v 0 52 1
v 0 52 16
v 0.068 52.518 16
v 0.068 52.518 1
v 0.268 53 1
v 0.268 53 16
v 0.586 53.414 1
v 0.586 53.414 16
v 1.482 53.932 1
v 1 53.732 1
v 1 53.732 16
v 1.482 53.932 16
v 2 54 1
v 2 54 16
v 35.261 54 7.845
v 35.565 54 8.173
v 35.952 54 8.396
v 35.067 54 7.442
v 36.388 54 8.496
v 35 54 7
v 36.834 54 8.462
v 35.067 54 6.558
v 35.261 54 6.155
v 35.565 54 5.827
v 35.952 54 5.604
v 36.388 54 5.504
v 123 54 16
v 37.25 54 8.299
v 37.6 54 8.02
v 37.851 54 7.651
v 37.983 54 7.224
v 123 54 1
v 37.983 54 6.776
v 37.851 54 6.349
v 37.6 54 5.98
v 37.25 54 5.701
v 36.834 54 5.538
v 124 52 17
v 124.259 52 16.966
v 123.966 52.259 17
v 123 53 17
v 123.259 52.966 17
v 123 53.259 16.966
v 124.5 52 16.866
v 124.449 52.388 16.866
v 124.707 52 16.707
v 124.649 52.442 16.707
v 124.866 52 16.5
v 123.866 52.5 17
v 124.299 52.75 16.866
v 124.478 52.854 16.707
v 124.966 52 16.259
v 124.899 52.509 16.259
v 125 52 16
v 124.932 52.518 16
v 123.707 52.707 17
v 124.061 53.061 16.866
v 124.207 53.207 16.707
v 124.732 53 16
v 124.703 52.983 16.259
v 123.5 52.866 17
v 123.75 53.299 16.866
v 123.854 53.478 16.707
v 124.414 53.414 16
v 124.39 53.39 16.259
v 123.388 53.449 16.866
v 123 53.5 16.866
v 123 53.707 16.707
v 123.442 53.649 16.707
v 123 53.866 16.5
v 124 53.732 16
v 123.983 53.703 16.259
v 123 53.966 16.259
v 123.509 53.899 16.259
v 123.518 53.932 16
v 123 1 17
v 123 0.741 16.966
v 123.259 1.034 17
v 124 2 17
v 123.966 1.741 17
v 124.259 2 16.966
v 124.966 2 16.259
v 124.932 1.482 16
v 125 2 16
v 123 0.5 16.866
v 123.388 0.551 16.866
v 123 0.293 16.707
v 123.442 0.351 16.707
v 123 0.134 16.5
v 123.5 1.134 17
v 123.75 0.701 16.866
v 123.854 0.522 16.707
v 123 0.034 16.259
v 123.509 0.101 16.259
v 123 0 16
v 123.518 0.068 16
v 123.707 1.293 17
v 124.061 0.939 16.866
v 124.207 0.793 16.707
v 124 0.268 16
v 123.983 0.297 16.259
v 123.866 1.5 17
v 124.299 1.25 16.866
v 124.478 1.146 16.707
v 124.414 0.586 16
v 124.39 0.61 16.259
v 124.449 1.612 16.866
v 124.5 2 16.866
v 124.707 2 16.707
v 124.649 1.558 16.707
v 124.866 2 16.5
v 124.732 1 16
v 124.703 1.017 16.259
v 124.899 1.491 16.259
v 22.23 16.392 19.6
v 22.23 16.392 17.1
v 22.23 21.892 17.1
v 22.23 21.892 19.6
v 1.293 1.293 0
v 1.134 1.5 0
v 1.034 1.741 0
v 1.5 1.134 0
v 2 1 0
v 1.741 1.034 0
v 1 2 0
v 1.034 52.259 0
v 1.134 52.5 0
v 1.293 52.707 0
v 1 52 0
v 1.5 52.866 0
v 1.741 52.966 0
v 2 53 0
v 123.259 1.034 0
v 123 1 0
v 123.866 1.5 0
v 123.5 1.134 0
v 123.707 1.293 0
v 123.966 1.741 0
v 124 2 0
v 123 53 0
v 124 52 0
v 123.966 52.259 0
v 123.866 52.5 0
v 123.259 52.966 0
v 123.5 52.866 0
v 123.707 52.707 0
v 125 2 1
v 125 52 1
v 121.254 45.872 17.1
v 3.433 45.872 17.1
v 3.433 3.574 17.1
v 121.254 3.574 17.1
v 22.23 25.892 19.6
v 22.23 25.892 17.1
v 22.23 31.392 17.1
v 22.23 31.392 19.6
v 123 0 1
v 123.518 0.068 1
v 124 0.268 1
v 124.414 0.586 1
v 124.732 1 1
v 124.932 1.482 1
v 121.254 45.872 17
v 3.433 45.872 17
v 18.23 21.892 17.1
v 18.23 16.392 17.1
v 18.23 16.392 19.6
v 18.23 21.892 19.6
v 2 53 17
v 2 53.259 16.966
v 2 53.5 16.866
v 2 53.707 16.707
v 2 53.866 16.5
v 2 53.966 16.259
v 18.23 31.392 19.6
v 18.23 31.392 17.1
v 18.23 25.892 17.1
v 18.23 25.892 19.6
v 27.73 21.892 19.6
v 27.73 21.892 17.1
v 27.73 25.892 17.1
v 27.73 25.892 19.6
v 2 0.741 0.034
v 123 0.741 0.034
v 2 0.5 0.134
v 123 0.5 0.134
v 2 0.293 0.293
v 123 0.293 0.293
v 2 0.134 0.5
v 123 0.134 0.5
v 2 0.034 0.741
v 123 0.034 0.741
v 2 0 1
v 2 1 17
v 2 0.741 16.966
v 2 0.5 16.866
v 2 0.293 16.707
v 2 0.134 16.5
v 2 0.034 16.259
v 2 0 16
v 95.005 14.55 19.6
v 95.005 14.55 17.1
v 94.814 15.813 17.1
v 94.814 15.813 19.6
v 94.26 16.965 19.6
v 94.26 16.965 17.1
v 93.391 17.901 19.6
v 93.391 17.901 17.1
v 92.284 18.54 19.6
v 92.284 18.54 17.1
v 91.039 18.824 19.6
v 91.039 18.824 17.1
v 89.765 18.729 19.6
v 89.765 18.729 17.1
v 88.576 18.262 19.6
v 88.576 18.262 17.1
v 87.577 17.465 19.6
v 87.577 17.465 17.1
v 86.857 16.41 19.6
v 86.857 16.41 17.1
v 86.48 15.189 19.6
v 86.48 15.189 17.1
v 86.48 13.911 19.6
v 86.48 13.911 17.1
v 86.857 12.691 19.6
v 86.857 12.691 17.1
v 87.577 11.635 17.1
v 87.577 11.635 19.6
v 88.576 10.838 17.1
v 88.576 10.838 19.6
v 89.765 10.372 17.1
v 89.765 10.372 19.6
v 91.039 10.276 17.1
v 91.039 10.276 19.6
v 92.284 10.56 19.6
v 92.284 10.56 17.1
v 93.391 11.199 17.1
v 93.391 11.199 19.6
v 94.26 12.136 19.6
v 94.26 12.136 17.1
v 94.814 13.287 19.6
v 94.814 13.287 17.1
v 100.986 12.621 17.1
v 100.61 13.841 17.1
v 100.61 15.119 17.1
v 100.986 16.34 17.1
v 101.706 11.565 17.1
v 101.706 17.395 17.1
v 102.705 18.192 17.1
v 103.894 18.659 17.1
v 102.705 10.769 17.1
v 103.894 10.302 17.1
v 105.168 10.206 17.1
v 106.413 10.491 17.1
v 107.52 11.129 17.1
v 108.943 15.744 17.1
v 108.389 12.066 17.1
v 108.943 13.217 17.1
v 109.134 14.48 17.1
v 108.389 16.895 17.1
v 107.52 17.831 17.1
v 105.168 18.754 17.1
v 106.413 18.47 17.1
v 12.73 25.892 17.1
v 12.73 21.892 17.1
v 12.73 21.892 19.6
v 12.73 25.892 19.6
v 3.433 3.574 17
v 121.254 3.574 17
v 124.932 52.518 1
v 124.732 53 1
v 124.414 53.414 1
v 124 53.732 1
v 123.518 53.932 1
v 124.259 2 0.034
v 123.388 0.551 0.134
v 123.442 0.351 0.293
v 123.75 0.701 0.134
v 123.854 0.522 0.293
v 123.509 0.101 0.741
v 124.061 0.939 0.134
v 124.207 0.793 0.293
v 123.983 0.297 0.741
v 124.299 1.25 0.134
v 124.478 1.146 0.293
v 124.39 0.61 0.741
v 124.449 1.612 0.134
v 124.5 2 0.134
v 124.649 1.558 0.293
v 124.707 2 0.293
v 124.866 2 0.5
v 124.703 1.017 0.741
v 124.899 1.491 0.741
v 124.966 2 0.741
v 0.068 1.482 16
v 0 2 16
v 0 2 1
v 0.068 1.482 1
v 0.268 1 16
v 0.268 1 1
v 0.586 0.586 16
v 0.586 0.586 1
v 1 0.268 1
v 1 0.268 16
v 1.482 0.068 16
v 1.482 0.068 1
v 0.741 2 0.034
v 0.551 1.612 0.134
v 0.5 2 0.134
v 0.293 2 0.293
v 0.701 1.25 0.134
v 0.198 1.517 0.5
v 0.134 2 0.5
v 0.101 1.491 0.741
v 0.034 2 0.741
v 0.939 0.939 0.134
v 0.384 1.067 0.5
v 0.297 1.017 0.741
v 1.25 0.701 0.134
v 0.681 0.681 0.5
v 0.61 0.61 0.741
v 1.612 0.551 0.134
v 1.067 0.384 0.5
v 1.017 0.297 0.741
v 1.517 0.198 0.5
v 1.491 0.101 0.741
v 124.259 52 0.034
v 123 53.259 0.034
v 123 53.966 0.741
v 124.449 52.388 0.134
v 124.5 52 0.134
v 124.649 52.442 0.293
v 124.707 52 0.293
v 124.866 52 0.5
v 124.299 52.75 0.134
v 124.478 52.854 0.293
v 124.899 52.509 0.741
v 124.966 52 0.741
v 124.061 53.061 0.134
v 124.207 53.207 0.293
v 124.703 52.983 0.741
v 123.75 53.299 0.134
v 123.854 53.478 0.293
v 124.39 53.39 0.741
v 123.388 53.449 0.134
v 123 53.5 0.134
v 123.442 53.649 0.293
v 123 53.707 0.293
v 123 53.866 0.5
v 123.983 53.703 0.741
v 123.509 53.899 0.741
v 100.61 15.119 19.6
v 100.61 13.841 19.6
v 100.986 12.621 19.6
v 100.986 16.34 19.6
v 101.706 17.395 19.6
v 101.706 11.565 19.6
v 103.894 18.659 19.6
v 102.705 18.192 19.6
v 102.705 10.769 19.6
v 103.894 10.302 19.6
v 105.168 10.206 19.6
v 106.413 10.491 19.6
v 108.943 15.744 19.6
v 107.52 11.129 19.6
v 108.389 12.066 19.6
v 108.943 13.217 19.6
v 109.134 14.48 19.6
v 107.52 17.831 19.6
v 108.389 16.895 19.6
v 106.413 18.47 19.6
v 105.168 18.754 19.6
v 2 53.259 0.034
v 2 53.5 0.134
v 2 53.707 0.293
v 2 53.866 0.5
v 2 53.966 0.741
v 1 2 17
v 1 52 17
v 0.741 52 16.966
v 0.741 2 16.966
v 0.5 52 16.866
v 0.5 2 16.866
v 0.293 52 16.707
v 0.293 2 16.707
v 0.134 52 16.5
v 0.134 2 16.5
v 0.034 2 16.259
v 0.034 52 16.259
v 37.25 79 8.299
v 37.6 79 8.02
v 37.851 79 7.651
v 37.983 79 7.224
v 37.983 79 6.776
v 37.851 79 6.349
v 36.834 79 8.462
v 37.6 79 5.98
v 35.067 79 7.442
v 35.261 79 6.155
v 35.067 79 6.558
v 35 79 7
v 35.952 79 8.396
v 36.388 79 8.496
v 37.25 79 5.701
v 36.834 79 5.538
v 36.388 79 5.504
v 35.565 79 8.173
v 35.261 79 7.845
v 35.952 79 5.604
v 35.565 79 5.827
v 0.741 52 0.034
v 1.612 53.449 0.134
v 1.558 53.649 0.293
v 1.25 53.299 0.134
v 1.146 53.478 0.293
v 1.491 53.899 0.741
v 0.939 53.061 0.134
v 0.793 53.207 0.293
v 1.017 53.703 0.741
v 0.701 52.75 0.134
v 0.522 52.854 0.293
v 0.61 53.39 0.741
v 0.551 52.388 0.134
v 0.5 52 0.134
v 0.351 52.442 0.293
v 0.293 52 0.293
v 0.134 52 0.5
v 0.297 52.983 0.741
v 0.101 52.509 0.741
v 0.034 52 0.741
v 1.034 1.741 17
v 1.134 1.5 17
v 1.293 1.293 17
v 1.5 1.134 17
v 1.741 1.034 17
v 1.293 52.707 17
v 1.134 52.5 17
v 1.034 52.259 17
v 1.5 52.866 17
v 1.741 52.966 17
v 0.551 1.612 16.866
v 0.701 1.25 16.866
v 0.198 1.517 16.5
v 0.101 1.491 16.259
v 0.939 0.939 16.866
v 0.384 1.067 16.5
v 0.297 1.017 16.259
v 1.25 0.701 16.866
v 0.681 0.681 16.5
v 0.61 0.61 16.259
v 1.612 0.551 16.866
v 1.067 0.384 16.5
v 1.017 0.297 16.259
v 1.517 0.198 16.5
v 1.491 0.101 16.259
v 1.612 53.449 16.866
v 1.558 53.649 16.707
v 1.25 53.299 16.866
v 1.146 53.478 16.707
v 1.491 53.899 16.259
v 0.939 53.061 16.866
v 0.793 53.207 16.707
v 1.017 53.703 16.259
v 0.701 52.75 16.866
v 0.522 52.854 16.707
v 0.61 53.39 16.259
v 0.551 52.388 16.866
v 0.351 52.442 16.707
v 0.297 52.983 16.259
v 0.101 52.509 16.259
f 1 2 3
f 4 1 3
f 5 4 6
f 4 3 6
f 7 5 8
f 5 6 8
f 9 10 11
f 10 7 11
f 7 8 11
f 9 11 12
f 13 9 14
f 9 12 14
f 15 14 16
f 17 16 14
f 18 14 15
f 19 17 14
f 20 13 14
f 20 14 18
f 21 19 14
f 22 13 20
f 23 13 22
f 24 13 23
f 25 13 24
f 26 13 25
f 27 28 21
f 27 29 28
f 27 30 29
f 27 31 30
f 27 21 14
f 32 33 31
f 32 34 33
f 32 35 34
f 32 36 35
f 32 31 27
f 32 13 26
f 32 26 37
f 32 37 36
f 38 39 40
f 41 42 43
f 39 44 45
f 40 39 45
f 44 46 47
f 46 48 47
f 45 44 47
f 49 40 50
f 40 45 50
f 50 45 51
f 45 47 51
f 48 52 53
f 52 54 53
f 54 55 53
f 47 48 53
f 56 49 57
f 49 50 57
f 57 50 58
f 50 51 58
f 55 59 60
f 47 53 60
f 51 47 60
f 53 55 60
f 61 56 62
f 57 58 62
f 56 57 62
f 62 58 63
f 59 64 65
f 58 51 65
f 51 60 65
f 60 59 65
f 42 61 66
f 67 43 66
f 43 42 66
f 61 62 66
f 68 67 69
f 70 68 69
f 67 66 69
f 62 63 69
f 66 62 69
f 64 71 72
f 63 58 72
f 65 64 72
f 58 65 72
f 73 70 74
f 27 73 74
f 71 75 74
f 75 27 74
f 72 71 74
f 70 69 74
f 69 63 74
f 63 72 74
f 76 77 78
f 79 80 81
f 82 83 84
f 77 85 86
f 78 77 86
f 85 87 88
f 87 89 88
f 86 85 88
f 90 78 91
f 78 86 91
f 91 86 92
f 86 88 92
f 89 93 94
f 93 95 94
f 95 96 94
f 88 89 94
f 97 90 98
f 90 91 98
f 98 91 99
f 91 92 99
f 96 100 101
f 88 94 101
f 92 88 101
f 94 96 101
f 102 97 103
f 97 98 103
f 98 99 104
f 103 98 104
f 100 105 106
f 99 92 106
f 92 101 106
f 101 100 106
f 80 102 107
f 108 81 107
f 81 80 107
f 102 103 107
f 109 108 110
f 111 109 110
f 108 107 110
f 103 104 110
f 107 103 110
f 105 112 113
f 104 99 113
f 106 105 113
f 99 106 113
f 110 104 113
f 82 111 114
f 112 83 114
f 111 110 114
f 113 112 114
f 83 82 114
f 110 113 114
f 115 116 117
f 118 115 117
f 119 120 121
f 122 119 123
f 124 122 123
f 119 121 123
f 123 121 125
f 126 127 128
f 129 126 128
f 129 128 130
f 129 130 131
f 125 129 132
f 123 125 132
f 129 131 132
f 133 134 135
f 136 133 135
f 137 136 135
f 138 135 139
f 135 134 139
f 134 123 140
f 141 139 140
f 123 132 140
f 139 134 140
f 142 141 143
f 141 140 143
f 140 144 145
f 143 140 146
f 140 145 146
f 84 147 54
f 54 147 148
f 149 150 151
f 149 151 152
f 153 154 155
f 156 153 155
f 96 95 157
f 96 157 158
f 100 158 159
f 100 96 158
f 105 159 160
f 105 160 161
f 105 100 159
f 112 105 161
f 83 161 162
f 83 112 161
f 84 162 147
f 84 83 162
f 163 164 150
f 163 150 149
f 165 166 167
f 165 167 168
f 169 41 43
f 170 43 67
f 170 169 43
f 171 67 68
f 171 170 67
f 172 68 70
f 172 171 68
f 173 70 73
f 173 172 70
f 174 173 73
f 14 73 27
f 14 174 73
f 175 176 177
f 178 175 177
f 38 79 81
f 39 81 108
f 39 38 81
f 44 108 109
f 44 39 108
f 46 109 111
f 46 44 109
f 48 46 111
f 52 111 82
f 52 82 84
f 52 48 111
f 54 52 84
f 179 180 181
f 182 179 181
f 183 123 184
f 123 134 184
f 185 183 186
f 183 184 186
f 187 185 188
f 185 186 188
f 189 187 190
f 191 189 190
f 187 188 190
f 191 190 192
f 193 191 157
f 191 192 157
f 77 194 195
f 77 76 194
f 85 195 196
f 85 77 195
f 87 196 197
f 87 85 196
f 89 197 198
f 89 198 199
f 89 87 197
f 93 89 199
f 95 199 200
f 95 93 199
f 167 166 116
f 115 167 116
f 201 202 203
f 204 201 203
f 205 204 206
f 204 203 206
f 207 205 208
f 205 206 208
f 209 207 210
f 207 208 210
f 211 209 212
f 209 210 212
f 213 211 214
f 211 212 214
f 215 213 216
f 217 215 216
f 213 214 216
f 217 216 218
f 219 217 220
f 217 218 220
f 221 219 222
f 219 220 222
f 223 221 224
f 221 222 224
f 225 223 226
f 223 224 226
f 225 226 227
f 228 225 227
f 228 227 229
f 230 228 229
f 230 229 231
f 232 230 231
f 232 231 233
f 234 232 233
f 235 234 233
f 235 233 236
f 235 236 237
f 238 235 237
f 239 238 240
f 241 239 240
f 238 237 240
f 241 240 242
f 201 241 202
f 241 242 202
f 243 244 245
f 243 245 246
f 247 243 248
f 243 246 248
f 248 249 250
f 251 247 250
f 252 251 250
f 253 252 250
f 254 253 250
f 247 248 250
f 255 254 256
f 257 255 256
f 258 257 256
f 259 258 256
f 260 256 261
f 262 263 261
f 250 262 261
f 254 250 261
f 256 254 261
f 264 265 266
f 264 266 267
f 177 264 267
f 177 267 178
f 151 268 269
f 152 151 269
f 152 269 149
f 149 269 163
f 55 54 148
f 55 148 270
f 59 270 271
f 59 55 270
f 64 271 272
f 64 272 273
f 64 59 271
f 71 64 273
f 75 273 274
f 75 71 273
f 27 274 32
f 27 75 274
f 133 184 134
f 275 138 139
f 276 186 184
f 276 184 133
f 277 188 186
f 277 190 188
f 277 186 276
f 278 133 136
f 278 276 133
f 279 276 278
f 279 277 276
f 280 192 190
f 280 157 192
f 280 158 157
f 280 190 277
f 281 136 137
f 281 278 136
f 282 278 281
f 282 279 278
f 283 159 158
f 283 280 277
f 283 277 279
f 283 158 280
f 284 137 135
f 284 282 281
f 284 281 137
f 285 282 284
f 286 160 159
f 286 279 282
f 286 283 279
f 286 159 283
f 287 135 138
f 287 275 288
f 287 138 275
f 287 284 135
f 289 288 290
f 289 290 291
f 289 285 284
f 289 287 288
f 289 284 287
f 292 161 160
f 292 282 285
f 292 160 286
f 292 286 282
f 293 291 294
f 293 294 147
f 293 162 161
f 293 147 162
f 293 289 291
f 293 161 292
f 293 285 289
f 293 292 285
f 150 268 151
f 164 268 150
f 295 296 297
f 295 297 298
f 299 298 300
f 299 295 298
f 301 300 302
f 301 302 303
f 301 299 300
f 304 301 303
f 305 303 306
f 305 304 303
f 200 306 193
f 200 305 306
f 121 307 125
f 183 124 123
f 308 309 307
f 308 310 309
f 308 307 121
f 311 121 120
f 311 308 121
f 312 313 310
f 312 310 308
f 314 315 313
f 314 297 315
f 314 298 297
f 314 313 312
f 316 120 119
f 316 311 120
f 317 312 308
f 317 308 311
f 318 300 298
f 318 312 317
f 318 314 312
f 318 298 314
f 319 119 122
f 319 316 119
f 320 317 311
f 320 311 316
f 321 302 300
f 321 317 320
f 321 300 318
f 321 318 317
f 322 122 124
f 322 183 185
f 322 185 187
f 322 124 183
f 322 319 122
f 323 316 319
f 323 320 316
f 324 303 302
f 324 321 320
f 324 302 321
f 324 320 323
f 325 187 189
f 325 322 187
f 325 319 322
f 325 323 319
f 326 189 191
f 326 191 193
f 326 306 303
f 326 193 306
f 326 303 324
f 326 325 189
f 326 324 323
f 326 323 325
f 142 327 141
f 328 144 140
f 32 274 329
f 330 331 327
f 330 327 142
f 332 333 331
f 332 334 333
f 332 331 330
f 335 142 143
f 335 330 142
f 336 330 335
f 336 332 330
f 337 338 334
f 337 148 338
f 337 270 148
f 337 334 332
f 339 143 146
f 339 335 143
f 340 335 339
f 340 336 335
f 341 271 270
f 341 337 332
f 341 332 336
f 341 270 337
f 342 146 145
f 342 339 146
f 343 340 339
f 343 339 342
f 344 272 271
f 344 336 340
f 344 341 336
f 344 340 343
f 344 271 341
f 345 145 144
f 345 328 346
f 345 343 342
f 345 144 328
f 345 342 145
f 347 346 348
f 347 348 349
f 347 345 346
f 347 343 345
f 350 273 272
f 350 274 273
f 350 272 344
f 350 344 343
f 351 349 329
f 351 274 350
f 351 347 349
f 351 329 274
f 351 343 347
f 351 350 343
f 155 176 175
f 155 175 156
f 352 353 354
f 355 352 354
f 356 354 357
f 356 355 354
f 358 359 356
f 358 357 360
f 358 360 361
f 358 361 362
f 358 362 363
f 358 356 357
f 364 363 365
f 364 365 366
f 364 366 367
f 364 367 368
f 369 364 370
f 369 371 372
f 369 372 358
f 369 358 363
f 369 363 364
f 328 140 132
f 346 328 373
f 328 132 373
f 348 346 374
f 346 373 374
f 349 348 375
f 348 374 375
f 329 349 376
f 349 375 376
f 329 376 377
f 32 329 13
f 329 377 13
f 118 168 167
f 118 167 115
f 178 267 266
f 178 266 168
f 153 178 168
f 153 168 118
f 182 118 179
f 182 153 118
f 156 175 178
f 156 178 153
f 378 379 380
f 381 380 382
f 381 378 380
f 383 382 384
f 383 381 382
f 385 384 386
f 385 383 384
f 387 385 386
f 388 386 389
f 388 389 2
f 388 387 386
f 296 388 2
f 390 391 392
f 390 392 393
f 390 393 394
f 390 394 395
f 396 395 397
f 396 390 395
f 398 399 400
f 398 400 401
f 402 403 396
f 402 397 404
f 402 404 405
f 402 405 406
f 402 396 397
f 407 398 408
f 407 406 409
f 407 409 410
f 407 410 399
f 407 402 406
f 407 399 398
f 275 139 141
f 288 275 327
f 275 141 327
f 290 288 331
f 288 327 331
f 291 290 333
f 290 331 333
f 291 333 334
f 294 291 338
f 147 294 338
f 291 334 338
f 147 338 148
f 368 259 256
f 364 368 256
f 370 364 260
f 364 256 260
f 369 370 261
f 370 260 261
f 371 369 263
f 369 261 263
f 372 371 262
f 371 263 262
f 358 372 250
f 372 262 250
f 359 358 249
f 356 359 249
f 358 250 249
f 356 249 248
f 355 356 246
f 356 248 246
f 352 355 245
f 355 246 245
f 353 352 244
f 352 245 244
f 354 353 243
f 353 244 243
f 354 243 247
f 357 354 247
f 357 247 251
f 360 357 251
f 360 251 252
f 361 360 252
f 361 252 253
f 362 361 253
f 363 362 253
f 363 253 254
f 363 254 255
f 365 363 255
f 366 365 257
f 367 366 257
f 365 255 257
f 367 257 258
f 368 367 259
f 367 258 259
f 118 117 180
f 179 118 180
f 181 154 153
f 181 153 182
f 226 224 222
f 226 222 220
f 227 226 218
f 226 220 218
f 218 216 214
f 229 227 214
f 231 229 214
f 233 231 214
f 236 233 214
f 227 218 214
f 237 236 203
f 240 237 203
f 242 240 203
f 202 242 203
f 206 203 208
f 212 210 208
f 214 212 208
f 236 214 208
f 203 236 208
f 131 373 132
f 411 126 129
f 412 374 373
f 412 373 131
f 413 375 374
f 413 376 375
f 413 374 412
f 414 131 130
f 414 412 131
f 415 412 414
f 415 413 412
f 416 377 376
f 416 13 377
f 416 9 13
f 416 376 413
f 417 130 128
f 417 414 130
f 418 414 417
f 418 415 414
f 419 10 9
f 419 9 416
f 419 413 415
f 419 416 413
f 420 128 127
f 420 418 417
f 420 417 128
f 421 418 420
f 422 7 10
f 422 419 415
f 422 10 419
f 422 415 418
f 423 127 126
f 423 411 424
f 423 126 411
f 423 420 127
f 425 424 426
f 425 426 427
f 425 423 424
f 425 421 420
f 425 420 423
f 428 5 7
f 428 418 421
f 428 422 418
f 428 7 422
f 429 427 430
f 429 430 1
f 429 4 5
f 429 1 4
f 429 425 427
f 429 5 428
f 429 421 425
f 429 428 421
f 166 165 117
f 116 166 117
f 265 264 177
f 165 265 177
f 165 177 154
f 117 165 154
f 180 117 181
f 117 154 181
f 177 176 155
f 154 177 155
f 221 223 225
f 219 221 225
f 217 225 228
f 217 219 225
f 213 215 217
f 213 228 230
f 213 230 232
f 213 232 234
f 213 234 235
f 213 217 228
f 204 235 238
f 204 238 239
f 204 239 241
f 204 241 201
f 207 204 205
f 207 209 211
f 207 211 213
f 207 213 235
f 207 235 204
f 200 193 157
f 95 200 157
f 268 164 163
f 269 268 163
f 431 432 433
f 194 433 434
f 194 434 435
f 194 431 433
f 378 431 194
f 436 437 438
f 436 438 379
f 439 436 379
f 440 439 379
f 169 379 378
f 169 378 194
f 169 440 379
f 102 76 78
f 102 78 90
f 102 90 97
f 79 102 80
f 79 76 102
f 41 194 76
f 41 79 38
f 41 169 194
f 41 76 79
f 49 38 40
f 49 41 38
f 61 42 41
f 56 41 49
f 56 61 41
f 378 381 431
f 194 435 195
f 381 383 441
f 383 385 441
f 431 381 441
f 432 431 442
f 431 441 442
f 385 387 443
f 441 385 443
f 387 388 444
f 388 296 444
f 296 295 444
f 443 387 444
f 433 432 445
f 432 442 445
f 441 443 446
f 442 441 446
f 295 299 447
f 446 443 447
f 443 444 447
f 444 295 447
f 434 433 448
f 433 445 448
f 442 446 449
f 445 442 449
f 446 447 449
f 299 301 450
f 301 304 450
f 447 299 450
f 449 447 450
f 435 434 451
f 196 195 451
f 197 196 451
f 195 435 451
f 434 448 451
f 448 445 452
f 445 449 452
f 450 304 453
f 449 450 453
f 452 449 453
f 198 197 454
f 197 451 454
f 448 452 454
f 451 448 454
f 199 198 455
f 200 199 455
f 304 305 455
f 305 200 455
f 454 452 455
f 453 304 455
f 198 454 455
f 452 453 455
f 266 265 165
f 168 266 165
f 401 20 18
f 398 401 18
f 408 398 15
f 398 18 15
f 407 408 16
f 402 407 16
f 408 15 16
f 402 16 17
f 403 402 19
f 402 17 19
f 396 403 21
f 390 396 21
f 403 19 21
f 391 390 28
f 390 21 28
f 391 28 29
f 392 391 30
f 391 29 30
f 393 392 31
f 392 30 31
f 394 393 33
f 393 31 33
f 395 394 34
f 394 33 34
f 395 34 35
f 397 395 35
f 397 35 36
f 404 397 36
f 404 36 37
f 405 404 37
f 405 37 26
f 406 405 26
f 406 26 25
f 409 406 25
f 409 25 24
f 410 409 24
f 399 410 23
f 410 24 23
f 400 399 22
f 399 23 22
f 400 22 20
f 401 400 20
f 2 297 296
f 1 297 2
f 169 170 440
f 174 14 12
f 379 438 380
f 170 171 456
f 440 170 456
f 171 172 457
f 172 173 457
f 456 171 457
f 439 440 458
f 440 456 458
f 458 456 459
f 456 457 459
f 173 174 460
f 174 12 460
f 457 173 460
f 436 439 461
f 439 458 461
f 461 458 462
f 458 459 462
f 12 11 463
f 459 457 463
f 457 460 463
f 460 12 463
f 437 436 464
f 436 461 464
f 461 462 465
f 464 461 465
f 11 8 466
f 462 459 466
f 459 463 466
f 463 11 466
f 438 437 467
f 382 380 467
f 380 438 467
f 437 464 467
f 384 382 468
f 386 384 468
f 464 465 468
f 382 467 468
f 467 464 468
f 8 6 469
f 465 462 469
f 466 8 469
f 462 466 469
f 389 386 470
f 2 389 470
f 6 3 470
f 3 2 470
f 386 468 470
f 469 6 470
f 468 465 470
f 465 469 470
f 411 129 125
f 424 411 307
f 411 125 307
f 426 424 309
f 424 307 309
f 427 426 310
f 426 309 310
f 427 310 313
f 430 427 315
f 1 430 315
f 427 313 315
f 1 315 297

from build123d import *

# Parameters (mm, degrees)
F0_W      = 125
F0_H      = 54
F1_DEPTH  = 17
F2_R      = 2
F3_R      = 1
F4_W      = 117.8211255465
F4_H      = 42.2981732991
F5_DEPTH  = 0.1
F6_R      = 4.2859634774
F7_DEPTH  = 2.5
F8_W      = 4
F8_H      = 5.5
F8_H_2    = 4
F8_W_2    = 5.5
F9_DEPTH  = 2.5
F10_R     = 1.5
F11_DEPTH = 25


with BuildPart() as f1:
    # F0 (on Top) → F1 (new body)
    with BuildSketch(Plane.XY):
        with Locations((62.5, 27)):
            Rectangle(F0_W, F0_H)
    extrude(amount=F1_DEPTH)

    # F2
    f2_edges = [f1.edges().sort_by_distance(p)[0] for p in [
        (125, 54, 8.5),
        (125, 0, 8.5),
        (0, 0, 8.5),
        (0, 54, 8.5),
    ]]
    fillet(f2_edges, radius=F2_R)

    # F3
    f3_edges = [f1.edges().sort_by_distance(p)[0] for p in [
        (62.5, 0, 17),
        (62.5, 0, 0),
    ]]
    fillet(f3_edges, radius=F3_R)

    # F10 (on face) → F11 (join)
    with BuildSketch(Plane(origin=(0, 54, 0), x_dir=(-1, 0, 0), z_dir=(0, 1, 0))):
        with Locations((-36.5, 7)):
            Circle(F10_R)
    extrude(amount=F11_DEPTH)


with BuildPart() as f5:
    # F4 (on face) → F5 (new body)
    with BuildSketch(Plane.XY.offset(17)):
        with Locations((62.3436578317, 24.7231359826)):
            Rectangle(F4_W, F4_H)
    extrude(amount=F5_DEPTH)


with BuildPart() as f7:
    # F6 (on face) → F7 (new body)
    with BuildSketch(Plane.XY.offset(17.1)):
        with Locations((90.718537569, 14.5501866937)):
            Circle(F6_R)
    extrude(amount=F7_DEPTH)


with BuildPart() as f7b:
    # F6 (on face) → F7, piece 2 (new body)
    with BuildSketch(Plane.XY.offset(17.1)):
        with Locations((104.8476472497, 14.4802611321)):
            Circle(F6_R)
    extrude(amount=F7_DEPTH)


with BuildPart() as f9:
    # F8 (on face) → F9 (new body)
    with BuildSketch(Plane.XY.offset(17.1)):
        with Locations((20.2296683006, 28.64183532)):
            Rectangle(F8_W, F8_H)
        with Locations((20.2296683006, 23.89183532)):
            Rectangle(F8_W, F8_H_2)
        with Locations((15.4796683006, 23.89183532)):
            Rectangle(F8_W_2, F8_H_2)
        with Locations((24.9796683006, 23.89183532)):
            Rectangle(F8_W_2, F8_H_2)
        with Locations((20.2296683006, 19.14183532)):
            Rectangle(F8_W, F8_H)
    extrude(amount=F9_DEPTH)


solid = Compound([f1.part, f5.part, f7.part, f7b.part, f9.part])
